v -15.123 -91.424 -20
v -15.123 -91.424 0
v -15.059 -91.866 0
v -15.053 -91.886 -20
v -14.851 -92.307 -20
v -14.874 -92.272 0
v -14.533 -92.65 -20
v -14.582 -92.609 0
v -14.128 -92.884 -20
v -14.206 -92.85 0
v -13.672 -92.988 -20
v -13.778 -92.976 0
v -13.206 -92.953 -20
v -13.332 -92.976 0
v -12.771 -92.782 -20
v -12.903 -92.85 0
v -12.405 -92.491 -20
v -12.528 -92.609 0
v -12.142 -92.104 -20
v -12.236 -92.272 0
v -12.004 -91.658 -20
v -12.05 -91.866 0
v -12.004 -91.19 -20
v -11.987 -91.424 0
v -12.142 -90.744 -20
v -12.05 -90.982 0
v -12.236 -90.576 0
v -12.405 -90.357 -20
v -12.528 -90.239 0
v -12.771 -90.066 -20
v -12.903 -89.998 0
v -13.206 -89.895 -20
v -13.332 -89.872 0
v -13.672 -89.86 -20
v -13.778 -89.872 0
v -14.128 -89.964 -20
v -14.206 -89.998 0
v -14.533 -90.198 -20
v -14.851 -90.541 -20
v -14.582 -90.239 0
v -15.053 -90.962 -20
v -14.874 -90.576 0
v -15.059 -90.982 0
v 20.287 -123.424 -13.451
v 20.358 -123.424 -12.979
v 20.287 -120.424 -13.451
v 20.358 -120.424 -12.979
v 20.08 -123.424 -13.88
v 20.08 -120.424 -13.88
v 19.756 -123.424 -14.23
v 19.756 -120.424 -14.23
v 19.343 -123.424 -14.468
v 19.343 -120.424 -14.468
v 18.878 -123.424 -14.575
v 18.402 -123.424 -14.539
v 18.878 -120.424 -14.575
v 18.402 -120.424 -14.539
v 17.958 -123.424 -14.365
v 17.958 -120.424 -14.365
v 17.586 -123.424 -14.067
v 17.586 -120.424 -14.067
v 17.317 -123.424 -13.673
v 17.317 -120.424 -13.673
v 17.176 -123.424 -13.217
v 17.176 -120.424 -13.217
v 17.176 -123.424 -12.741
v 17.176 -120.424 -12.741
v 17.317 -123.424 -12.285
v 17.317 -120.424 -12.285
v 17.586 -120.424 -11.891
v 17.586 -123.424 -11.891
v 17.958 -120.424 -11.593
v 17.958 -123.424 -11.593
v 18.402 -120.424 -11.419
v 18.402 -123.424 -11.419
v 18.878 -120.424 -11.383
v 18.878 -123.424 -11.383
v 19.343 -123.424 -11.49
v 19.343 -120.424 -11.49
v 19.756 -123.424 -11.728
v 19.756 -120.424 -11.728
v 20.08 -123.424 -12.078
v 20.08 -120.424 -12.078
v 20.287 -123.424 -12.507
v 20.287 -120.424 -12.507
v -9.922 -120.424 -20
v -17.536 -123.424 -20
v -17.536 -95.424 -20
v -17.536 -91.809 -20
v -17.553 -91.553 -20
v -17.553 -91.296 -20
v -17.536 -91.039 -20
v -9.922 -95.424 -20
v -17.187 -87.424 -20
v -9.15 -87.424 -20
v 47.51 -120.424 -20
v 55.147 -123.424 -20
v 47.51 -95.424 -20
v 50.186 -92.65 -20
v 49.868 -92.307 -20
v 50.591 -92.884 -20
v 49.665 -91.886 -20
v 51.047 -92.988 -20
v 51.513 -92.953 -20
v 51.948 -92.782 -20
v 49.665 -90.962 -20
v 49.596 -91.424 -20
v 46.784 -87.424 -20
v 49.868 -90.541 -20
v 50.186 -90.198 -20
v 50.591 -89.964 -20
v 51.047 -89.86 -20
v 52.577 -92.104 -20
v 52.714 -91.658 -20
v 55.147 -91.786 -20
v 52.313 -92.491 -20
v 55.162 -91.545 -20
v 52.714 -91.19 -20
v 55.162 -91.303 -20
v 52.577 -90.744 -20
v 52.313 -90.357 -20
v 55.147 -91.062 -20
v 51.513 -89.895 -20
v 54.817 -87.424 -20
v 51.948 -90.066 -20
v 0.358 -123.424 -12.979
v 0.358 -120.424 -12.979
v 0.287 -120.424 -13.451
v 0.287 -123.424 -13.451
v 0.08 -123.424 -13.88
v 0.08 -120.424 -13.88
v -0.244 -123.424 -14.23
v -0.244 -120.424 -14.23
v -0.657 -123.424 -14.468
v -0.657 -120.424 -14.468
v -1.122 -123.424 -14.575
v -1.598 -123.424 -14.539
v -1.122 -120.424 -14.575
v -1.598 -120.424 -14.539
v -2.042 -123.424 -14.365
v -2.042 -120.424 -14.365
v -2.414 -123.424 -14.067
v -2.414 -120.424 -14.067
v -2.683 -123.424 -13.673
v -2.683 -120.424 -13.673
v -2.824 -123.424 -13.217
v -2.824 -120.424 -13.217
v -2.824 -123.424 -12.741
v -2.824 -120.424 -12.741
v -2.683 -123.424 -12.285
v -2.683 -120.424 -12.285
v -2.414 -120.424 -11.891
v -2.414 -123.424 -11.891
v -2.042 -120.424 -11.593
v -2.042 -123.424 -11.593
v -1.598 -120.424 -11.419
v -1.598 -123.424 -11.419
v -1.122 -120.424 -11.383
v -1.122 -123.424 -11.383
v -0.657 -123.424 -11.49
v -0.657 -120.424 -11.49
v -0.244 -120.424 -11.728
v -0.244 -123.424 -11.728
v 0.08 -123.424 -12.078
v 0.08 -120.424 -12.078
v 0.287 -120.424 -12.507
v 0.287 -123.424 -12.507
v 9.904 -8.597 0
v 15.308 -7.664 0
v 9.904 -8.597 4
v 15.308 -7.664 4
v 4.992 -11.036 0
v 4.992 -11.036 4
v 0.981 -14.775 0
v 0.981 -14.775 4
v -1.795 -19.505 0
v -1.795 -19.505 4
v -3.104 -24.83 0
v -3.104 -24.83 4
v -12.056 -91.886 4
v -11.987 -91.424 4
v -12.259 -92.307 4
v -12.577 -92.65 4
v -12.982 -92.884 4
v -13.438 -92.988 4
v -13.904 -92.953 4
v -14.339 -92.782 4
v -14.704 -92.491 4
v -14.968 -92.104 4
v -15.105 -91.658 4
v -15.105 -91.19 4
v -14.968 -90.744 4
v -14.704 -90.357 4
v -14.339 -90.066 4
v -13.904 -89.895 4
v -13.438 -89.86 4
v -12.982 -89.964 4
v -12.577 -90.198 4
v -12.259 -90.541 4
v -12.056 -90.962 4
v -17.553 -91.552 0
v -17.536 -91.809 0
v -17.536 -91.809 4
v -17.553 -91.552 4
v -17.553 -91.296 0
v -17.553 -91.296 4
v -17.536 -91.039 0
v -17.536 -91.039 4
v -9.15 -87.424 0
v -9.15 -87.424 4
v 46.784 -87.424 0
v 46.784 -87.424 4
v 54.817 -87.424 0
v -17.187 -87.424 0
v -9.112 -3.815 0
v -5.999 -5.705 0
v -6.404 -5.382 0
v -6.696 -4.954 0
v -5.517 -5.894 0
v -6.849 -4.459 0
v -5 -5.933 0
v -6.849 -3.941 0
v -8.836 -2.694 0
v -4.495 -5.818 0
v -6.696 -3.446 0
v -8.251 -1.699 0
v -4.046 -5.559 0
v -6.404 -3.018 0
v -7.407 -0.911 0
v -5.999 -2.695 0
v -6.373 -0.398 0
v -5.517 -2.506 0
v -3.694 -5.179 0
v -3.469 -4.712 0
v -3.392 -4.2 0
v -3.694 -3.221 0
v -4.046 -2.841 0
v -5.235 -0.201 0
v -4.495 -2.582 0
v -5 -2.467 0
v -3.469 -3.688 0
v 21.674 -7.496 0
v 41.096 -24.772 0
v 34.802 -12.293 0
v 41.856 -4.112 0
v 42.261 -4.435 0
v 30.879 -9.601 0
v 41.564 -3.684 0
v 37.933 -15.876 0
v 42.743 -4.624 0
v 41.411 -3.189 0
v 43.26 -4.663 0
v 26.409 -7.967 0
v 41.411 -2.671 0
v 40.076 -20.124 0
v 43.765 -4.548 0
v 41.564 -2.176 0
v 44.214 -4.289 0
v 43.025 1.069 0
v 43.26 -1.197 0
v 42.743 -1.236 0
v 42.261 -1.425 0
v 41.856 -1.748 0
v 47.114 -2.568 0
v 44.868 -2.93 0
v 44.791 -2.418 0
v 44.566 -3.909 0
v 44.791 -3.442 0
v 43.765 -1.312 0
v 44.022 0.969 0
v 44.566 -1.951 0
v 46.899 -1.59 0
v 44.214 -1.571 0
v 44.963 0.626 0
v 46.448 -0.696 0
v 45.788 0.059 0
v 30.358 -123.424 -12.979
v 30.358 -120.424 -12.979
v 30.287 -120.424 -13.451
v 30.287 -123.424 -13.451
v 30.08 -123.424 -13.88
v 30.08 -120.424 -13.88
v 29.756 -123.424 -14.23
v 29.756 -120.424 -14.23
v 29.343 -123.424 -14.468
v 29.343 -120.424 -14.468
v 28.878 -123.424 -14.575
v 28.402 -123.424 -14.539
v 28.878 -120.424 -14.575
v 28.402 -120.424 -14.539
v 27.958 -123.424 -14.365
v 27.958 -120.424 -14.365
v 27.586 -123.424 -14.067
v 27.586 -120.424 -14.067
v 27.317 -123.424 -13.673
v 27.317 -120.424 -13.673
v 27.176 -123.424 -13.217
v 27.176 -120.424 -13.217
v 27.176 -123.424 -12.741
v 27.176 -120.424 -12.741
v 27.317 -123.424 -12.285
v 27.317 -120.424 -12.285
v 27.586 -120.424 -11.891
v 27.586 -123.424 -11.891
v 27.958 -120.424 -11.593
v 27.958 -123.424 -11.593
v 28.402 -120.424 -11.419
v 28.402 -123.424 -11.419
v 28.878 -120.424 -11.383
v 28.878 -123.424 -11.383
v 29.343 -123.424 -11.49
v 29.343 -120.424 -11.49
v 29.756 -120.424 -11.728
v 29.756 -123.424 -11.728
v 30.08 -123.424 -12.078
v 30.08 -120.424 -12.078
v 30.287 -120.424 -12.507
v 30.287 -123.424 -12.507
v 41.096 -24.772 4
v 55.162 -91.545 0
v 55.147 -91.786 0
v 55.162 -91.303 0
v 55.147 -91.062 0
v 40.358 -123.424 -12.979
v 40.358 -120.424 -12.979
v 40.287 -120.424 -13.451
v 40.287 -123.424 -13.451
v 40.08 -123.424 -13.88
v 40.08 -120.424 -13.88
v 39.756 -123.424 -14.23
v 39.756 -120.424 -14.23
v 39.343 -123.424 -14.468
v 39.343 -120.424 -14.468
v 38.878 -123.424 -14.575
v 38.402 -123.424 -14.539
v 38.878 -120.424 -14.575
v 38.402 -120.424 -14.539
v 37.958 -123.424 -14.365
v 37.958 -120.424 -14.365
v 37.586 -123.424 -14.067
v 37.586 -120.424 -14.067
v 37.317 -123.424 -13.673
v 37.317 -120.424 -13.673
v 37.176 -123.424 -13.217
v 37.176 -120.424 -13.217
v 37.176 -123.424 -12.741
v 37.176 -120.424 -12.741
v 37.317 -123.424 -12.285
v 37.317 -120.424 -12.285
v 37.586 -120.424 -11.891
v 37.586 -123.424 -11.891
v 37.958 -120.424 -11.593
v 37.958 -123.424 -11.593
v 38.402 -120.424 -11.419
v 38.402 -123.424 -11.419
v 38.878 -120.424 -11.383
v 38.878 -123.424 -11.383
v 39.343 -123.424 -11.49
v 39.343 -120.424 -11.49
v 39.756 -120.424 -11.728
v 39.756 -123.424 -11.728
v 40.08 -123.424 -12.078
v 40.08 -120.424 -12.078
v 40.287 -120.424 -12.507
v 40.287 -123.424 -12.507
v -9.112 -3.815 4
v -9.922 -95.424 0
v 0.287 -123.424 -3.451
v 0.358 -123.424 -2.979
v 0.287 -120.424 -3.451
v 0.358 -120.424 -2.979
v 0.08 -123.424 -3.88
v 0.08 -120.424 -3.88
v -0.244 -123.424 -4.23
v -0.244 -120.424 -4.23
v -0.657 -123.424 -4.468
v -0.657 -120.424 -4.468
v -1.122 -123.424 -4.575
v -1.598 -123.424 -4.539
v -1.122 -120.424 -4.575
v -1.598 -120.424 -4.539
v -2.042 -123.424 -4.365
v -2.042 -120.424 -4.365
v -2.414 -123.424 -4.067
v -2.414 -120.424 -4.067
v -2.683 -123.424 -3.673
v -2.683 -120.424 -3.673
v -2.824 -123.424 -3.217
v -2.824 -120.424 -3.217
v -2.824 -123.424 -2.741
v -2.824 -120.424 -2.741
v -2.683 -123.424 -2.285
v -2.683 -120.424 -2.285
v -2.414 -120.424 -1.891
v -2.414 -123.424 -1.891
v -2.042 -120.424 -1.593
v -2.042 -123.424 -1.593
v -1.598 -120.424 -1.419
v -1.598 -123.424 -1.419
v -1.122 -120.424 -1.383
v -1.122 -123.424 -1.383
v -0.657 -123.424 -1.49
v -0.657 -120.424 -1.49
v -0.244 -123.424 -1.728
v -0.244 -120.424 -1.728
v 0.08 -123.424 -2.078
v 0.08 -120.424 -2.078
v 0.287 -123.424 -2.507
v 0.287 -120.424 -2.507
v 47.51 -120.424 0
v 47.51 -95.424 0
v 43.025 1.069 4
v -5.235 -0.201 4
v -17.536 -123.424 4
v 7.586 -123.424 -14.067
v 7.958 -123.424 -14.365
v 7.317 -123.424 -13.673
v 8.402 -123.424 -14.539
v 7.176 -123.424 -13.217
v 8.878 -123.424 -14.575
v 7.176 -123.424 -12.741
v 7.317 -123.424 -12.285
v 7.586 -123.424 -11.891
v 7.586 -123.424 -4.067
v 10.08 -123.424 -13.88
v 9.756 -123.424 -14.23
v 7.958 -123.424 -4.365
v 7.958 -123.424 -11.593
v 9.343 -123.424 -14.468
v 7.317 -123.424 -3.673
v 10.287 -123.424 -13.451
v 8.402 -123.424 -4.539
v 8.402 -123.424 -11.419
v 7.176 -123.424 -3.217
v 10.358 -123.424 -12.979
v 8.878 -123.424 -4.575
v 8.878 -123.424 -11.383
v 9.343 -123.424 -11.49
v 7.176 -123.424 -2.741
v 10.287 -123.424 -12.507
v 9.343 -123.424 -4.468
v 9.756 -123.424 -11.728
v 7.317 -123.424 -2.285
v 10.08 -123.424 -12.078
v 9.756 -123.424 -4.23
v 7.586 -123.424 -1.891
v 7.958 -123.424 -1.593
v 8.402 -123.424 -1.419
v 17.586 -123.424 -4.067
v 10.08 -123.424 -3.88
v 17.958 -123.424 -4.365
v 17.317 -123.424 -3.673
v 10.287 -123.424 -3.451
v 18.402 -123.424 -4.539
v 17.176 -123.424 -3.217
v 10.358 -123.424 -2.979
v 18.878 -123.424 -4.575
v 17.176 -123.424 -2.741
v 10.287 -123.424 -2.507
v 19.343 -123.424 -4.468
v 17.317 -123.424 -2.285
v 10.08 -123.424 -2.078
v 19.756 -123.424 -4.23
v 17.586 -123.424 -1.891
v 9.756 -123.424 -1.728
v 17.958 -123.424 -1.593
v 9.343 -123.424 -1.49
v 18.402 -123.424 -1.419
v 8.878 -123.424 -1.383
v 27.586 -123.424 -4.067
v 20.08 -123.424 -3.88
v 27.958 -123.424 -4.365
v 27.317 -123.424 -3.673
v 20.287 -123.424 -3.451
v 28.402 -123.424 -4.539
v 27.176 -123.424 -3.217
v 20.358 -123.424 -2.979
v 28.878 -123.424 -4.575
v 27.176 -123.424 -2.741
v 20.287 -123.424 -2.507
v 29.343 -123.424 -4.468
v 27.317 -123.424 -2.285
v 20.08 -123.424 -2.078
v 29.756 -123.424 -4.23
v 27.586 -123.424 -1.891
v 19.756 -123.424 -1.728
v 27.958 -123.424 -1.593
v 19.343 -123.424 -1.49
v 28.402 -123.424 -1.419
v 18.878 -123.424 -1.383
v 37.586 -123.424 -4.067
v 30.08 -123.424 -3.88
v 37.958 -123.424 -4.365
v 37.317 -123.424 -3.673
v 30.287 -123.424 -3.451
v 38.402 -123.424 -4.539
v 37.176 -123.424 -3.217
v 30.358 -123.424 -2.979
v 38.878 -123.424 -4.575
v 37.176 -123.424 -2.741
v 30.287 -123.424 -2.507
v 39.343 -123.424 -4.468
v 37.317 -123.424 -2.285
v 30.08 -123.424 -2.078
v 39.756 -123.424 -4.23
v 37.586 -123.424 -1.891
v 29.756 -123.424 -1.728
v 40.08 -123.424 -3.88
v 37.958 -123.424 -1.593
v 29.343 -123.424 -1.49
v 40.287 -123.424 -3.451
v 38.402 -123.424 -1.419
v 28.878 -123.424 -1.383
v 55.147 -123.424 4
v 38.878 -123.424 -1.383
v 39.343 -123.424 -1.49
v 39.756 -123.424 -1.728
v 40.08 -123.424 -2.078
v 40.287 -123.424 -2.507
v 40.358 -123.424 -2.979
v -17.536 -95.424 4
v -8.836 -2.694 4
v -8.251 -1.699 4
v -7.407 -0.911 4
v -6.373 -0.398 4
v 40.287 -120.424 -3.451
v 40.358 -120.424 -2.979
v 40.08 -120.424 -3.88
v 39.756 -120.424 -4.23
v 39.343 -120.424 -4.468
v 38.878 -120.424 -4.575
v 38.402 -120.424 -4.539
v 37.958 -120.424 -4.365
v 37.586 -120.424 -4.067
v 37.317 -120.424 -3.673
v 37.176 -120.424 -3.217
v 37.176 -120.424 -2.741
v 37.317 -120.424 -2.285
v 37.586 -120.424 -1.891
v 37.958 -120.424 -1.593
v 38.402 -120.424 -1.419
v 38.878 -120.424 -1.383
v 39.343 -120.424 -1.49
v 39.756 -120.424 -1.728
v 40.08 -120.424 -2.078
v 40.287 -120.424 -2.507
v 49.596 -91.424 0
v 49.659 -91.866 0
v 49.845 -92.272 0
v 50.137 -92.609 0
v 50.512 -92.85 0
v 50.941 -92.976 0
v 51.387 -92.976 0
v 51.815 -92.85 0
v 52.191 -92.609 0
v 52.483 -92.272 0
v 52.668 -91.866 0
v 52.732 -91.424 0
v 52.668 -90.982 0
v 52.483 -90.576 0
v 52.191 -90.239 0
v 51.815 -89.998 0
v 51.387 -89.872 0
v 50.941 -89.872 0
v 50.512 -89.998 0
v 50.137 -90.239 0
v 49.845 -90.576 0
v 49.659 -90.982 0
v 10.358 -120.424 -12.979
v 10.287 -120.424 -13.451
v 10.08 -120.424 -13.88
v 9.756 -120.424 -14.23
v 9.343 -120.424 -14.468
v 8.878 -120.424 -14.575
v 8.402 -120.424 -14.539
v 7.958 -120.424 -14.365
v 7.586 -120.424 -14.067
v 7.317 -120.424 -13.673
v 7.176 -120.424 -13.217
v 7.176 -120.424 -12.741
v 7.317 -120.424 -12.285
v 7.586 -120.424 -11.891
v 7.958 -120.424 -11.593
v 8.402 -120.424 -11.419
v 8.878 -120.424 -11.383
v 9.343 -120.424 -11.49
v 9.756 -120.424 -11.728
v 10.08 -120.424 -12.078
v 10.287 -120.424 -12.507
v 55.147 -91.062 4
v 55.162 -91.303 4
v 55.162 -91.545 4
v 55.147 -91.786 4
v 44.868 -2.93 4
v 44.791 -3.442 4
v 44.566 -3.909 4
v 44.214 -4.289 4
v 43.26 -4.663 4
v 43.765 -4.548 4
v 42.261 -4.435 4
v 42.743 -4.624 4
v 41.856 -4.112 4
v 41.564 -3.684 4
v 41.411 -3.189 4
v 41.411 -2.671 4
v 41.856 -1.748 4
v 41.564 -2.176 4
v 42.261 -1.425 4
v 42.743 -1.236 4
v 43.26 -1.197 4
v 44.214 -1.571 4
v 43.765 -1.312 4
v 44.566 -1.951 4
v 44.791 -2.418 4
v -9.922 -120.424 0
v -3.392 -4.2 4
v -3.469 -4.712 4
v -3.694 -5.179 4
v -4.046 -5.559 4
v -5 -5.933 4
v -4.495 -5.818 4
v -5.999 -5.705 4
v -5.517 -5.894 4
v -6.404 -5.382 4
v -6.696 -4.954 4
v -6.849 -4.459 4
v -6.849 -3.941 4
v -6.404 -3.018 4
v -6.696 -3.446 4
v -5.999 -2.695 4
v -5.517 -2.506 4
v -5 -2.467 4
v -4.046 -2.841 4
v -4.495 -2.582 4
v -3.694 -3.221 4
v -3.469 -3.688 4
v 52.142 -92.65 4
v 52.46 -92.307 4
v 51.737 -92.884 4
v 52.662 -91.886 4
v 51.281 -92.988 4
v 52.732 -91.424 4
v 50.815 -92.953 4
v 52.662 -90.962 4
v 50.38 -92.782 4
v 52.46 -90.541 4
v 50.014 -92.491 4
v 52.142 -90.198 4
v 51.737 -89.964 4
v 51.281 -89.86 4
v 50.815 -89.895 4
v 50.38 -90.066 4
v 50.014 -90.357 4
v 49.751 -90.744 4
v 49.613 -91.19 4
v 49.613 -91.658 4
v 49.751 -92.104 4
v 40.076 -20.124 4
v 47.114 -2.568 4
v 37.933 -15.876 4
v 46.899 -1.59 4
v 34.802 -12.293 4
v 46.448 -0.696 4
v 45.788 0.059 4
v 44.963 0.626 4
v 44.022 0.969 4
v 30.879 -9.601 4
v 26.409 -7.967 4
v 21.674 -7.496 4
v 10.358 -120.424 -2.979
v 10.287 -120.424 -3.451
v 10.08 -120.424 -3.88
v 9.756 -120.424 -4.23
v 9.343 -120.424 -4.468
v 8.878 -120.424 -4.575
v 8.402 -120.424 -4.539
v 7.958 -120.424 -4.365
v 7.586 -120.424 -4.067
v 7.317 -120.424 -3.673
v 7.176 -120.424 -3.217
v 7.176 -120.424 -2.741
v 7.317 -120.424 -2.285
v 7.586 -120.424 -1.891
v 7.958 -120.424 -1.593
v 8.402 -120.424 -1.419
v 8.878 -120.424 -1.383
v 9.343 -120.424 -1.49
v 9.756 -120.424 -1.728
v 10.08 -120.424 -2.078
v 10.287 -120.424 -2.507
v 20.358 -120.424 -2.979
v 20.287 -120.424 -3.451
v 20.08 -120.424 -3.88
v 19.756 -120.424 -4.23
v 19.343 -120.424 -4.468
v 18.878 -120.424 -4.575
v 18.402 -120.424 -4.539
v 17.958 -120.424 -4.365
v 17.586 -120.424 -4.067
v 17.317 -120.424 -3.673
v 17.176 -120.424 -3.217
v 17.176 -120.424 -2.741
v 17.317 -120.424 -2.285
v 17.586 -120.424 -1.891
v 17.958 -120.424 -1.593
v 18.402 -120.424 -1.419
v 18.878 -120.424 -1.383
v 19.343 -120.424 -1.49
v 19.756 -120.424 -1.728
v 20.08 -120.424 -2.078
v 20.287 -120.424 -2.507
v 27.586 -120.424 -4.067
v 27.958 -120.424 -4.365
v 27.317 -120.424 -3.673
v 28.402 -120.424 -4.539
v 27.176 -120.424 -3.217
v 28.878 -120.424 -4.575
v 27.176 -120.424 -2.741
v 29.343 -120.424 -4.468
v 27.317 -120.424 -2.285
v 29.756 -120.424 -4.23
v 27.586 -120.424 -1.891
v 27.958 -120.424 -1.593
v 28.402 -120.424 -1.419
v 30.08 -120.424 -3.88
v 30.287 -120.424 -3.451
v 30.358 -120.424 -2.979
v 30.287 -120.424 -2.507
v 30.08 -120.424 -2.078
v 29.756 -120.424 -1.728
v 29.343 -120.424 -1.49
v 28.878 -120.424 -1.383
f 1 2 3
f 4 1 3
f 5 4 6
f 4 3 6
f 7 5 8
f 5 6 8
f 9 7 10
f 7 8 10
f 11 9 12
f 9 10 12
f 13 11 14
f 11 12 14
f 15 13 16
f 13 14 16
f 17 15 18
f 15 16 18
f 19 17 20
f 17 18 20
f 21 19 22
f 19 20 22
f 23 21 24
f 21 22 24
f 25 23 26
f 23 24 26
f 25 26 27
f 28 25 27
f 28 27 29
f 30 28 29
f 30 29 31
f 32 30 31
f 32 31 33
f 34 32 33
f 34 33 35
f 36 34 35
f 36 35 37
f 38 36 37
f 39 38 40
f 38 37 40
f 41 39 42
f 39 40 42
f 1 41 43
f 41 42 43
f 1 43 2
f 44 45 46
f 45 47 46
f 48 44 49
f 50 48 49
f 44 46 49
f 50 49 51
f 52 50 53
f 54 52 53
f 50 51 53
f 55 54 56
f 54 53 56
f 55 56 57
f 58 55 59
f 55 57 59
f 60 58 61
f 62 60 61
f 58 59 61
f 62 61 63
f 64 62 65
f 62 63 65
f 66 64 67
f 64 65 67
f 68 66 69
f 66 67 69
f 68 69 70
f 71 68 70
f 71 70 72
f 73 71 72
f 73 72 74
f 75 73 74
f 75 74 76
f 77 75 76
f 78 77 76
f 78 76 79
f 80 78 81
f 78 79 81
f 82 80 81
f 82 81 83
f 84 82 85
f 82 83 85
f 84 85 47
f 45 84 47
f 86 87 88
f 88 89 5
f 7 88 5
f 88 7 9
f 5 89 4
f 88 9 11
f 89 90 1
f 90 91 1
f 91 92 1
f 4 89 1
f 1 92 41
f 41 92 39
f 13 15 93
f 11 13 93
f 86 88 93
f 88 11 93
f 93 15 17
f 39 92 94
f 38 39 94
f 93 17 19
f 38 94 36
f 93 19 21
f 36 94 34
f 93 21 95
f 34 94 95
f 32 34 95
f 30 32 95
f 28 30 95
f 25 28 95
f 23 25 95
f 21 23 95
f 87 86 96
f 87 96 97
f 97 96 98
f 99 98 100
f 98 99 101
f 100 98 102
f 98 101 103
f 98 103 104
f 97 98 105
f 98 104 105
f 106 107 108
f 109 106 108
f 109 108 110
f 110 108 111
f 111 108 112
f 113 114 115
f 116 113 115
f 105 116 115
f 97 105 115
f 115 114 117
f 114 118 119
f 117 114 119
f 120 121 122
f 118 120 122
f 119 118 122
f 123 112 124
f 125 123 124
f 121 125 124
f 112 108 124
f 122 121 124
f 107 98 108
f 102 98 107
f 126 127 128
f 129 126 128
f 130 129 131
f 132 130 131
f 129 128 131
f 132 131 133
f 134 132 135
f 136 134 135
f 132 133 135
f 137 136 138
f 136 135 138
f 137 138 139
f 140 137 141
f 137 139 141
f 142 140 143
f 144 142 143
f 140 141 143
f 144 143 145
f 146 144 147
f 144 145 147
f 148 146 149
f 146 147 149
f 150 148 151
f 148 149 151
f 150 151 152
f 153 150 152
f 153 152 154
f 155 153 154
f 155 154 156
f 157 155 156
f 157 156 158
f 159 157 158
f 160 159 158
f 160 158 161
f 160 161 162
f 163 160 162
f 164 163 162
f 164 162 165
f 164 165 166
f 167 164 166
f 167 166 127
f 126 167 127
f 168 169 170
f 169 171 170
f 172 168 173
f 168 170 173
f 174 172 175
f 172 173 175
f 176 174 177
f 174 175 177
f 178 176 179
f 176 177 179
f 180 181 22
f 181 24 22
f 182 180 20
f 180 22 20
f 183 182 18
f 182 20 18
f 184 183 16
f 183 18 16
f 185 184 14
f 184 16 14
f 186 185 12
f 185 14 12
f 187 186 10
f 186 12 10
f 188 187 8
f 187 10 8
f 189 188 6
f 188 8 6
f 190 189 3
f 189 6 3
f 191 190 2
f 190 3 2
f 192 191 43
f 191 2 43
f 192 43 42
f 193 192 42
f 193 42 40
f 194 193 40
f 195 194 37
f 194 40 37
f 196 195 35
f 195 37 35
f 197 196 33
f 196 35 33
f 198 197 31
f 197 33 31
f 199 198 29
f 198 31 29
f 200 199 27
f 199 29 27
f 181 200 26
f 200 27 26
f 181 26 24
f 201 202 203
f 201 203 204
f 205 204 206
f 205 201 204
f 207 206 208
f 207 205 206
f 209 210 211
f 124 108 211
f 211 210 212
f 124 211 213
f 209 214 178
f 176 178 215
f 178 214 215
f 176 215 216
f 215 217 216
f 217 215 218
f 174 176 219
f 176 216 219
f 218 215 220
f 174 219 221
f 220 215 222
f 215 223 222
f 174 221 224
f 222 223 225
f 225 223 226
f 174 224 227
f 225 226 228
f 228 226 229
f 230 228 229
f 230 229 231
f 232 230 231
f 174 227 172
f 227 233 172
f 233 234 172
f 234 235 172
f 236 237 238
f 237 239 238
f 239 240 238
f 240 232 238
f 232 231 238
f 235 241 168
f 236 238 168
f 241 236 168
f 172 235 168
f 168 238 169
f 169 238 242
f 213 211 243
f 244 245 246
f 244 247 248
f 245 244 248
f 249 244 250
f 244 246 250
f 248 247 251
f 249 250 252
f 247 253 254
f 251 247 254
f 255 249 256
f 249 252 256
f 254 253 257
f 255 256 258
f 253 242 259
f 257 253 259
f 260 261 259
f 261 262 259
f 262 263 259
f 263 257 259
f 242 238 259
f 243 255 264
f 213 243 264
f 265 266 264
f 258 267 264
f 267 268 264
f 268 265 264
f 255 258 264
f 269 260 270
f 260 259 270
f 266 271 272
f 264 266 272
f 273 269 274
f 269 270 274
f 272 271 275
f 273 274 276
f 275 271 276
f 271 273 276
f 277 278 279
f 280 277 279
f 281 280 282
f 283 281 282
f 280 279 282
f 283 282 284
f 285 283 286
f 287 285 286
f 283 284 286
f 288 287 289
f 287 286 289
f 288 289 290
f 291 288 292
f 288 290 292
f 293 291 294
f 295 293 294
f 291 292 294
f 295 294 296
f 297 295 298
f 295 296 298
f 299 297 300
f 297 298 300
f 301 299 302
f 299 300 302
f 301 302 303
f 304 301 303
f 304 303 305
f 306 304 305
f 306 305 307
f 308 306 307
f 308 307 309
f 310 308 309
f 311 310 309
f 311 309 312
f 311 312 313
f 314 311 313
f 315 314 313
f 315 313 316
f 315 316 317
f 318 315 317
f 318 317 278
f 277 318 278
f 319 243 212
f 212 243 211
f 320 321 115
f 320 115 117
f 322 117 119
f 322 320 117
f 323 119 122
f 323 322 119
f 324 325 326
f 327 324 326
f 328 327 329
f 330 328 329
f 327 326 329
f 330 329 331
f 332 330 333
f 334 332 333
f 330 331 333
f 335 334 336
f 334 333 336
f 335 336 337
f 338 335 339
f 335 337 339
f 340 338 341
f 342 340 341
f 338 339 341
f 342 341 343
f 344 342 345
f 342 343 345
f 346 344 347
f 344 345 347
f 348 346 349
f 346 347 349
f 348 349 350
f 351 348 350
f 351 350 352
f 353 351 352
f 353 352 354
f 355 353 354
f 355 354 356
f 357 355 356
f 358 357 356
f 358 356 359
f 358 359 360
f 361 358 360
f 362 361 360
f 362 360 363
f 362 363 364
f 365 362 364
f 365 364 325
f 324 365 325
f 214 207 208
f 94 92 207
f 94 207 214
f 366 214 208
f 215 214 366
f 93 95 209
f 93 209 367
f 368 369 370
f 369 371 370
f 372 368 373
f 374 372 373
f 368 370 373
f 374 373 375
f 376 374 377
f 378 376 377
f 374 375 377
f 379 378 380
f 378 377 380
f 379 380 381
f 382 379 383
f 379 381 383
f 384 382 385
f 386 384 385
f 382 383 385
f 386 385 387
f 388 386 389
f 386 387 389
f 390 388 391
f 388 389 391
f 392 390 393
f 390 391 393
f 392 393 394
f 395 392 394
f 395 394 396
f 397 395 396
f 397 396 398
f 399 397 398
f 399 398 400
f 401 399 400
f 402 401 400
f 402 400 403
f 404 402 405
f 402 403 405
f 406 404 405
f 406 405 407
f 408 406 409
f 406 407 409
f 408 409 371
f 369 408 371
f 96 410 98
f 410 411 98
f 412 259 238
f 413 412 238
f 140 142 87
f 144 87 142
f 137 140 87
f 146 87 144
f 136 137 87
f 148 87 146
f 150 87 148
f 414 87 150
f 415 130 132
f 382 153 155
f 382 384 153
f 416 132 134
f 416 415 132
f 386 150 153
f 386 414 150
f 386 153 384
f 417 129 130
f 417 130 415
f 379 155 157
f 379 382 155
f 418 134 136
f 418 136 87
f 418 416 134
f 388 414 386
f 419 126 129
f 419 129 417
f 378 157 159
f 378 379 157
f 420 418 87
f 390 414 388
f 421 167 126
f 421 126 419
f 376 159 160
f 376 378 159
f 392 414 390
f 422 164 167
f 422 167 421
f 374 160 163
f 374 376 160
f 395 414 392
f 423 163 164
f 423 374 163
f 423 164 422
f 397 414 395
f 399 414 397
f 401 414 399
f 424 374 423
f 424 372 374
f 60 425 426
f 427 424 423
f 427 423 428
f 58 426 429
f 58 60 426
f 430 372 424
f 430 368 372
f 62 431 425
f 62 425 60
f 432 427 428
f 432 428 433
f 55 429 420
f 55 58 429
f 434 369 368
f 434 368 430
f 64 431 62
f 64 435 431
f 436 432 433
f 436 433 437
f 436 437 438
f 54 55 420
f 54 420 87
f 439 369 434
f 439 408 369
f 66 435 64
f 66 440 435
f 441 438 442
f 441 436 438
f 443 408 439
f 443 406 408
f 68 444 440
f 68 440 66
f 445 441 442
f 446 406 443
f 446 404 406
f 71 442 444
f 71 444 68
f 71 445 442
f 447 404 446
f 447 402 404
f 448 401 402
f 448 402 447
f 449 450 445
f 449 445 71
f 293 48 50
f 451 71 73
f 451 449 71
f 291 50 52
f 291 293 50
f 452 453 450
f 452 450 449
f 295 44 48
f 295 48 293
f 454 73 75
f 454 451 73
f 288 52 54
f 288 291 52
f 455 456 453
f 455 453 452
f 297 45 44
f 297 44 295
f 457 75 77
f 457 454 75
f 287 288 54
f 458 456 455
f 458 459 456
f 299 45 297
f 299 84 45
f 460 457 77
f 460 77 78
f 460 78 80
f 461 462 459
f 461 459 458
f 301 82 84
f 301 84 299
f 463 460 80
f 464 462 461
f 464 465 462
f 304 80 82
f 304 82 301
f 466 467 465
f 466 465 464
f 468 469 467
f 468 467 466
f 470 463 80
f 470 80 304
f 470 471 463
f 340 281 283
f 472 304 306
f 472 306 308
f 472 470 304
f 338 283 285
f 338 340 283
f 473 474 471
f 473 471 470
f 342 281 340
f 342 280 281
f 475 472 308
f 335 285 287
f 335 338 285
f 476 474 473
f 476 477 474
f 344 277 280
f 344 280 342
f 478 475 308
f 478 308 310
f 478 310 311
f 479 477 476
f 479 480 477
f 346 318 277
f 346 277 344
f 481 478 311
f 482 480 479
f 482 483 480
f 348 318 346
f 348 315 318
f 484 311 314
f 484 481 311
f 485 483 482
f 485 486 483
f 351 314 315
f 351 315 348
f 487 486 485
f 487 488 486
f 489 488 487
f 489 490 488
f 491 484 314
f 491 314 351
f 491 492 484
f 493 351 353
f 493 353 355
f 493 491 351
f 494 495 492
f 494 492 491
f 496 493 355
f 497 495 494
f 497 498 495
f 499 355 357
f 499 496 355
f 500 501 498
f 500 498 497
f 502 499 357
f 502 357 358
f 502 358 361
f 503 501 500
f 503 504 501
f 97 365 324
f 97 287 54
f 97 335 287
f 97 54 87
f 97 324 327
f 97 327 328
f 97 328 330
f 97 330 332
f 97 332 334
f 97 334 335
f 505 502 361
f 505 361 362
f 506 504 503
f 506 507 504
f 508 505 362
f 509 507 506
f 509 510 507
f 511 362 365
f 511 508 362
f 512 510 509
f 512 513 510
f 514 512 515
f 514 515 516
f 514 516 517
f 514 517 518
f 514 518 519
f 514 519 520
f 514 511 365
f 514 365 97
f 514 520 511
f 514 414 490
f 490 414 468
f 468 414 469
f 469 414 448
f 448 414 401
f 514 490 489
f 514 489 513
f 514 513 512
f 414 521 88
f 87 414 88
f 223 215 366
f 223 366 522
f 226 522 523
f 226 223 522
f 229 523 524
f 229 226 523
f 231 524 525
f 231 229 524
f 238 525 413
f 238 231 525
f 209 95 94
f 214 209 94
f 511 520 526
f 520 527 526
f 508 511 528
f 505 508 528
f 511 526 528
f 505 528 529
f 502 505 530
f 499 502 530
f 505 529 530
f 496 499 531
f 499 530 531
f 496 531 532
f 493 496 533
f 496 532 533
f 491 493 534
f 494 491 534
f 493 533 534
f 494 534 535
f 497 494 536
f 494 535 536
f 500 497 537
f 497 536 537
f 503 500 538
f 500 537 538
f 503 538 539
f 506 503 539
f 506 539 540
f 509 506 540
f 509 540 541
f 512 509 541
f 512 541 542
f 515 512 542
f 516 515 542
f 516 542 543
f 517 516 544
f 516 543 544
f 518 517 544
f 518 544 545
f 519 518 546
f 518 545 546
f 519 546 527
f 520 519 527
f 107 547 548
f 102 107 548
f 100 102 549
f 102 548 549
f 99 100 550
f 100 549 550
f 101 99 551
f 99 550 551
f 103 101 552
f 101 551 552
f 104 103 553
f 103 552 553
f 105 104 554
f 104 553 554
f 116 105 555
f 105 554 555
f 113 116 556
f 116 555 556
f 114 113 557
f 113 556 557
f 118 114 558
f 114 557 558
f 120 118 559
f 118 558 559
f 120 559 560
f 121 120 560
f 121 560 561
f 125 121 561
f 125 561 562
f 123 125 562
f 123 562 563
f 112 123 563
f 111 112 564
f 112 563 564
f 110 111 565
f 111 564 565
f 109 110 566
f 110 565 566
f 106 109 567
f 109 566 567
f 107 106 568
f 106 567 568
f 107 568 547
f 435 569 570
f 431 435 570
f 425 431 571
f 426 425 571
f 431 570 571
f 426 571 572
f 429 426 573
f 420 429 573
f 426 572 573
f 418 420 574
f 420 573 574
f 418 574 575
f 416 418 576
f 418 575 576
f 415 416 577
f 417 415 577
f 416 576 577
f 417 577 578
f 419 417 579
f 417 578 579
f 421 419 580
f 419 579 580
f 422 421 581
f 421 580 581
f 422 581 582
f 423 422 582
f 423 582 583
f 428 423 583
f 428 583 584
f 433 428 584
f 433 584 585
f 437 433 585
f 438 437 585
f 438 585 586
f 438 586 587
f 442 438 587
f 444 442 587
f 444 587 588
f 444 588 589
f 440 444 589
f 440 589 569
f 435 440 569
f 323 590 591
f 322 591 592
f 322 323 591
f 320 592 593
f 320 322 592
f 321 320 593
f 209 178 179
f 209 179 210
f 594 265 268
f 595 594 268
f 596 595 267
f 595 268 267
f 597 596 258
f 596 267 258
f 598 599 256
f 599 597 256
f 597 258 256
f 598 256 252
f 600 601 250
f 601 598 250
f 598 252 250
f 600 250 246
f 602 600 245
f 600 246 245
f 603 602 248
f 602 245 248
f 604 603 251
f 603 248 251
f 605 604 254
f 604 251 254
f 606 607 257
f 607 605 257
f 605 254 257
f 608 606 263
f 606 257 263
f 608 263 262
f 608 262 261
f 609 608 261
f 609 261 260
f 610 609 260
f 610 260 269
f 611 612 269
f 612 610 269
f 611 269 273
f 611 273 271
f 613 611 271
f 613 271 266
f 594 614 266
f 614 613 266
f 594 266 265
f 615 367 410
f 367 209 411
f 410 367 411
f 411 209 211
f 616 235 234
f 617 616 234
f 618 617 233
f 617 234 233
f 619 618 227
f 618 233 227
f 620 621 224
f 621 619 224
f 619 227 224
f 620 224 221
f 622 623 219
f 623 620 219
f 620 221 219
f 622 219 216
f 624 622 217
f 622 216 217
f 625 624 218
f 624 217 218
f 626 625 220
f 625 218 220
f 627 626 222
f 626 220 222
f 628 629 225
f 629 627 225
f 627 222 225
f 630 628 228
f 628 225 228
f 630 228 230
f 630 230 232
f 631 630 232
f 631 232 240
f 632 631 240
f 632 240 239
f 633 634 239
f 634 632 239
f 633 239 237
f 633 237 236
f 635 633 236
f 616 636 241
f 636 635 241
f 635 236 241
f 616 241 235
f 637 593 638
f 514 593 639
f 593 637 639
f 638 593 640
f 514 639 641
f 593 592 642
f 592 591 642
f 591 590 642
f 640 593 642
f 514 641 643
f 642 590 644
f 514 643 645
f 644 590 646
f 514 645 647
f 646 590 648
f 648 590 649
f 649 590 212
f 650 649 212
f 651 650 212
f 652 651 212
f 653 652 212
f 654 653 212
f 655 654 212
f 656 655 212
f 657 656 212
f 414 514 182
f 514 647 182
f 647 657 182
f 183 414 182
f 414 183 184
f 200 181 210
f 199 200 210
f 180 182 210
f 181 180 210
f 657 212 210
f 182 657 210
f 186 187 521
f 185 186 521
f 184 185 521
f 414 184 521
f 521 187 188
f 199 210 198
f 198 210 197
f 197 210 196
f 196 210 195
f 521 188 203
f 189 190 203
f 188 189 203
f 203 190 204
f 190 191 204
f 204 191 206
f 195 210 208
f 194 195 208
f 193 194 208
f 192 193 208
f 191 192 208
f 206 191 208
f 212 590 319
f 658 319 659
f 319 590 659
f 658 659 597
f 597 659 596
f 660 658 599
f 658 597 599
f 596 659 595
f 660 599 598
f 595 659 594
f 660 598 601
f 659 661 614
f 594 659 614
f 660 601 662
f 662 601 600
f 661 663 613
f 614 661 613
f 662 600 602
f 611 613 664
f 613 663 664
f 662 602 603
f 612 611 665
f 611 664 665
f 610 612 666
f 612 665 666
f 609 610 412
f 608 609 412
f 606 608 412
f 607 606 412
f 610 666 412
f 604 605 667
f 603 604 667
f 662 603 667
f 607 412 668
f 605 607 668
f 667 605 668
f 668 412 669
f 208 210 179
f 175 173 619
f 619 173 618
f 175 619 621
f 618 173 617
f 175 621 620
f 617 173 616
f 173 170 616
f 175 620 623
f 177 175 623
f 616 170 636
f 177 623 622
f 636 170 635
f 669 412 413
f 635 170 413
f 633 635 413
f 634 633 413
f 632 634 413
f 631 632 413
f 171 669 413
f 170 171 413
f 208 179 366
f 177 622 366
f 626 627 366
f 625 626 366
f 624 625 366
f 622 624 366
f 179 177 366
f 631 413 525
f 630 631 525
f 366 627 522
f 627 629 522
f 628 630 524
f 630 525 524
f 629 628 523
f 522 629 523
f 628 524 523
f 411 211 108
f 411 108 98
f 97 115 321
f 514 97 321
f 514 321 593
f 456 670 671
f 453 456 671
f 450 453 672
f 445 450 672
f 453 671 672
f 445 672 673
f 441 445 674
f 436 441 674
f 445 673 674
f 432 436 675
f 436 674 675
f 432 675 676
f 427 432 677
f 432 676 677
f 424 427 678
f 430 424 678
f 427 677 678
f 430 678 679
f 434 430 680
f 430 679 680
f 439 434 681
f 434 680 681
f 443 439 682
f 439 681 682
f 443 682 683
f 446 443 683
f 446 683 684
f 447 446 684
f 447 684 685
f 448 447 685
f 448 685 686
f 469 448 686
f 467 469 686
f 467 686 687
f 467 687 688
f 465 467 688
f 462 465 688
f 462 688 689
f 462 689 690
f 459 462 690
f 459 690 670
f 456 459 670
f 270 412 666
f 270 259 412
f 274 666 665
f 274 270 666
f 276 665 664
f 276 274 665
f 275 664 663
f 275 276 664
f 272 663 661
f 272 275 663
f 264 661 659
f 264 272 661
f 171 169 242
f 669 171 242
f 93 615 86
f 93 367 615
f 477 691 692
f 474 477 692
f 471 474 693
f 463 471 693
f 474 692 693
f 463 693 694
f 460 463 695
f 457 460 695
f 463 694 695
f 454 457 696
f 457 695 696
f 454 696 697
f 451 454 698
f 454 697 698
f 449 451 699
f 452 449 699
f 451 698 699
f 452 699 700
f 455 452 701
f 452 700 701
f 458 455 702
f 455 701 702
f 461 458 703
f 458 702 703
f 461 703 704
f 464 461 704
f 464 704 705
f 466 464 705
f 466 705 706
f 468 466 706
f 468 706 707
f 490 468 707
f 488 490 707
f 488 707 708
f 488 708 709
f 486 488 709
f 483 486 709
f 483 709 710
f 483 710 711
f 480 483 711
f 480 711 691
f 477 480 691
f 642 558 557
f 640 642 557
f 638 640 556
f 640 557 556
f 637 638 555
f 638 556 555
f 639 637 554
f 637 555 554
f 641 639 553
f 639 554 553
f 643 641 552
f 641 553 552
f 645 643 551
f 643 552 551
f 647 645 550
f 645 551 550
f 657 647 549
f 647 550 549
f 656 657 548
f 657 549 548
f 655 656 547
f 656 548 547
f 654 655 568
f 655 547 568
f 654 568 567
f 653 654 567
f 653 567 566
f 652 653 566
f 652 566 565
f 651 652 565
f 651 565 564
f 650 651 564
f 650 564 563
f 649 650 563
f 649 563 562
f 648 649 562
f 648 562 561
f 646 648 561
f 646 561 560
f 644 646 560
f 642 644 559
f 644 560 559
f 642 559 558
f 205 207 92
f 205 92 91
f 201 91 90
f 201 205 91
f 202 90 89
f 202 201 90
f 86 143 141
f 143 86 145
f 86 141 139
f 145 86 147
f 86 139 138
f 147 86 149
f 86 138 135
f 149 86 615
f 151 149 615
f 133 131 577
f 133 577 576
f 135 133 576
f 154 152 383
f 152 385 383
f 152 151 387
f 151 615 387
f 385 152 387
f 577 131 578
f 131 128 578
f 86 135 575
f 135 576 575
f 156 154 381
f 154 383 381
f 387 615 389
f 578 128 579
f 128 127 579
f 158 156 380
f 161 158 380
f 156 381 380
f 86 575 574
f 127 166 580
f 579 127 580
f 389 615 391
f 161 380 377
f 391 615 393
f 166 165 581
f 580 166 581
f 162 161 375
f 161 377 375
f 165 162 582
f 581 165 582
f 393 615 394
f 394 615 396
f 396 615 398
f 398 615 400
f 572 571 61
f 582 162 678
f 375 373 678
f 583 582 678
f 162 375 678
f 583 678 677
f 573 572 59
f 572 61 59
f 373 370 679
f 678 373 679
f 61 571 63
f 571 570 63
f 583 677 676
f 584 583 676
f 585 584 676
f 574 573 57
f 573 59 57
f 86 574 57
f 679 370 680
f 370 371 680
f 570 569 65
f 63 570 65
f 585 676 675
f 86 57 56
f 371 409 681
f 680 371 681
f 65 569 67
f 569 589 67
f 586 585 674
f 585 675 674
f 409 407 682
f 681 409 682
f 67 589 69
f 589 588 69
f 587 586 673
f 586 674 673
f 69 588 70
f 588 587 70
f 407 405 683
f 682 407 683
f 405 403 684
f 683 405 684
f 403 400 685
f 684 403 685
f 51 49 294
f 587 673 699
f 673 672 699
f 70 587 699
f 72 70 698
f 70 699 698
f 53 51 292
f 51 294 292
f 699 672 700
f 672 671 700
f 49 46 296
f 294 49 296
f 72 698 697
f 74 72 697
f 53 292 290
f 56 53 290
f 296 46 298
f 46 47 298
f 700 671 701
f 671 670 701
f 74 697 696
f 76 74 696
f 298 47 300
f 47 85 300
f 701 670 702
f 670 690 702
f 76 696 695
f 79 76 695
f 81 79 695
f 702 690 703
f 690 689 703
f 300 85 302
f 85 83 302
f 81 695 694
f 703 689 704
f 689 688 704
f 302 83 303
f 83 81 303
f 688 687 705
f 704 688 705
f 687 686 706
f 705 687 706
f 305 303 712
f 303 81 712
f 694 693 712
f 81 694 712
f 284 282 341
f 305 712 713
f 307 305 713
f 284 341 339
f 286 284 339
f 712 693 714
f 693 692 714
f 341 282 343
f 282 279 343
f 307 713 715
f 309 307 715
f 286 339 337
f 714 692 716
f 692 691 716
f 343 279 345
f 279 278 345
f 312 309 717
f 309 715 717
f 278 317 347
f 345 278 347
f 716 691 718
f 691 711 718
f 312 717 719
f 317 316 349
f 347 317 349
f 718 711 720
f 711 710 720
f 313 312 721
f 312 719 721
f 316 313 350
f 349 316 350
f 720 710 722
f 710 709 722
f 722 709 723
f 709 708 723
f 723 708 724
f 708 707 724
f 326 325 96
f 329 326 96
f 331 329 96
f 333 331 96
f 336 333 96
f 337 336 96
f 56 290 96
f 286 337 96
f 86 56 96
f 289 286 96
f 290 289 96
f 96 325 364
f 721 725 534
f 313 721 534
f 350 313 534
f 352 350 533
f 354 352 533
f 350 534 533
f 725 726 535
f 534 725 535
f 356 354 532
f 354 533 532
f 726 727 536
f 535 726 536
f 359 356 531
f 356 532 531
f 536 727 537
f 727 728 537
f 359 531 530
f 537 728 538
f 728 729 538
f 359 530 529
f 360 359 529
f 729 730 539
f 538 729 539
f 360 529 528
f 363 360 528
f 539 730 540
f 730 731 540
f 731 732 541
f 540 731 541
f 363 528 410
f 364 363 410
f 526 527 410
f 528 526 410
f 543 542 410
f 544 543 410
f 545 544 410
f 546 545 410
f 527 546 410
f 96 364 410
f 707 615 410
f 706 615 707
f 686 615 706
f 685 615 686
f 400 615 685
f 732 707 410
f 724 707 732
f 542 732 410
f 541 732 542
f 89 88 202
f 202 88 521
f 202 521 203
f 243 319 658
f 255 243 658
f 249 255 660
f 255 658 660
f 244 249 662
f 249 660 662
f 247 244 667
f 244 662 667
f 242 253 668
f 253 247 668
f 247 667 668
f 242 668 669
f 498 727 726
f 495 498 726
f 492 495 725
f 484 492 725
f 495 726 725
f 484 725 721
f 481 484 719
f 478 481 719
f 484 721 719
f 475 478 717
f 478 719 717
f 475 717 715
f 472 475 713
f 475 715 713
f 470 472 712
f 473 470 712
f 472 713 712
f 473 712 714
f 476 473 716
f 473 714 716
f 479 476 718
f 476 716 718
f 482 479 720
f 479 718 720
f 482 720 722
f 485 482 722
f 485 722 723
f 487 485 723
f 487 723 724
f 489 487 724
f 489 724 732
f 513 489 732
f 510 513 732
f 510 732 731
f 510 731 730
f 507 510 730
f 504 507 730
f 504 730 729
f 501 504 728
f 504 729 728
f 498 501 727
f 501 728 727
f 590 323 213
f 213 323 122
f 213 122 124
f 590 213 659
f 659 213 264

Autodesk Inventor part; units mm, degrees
ref_plane "YZ Plane" through (0, 0, 0) normal (1, 0, 0) x (0, 1, 0)
ref_plane "XZ Plane" through (0, 0, 0) normal (0, 1, 0) x (-1, 0, 0)
sketch "Esquisse1" plane through (0, 0, 0) normal (0, 0, 1) x (1, 0, 0)
  circle A0 centre (-5.13, -4.2) radius 1.738 projected
  circle A1 centre (43.13, -2.93) radius 1.738 projected
  circle A2 centre (10.11, -55) radius 1.738 projected
  circle A3 centre (51.1638, -91.424) radius 1.5682 projected
  circle A4 centre (-13.5548, -91.424) radius 1.5682 projected
  line L0 (-5.13, -4.2) -> (43.13, -2.93) construction
  line L1 (-5.0248, -8.1986) -> (43.2352, -6.9286)
  line L2 (43.0248, 1.0686) -> (-5.2352, -0.2014)
  arc A5 (-5.2352, -0.2014) -> (-5.0248, -8.1986) centre (-5.13, -4.2) ccw
  arc A6 (43.2352, -6.9286) -> (43.0248, 1.0686) centre (43.13, -2.93) ccw
  arc A7 (-1.2987, -3.0506) -> (-8.9613, -5.3494) centre (-5.13, -4.2) ccw
  arc A8 (46.508, -5.0722) -> (39.752, -0.7878) centre (43.13, -2.93) ccw
  arc A9 (-16.909, -89.2447) -> (-10.2005, -93.6032) centre (-13.5548, -91.424) ccw
  arc A10 (48.5091, -94.4161) -> (53.8185, -88.4319) centre (51.1638, -91.424) ccw
  line L3 (43.13, -2.93) -> (51.1638, -91.424) construction
  line L4 (39.1464, -3.2916) -> (47.1802, -91.7856)
  line L5 (55.1474, -91.0623) -> (47.1136, -2.5684)
  arc A11 (47.1136, -2.5684) -> (39.1464, -3.2916) centre (43.13, -2.93) ccw
  arc A12 (47.1802, -91.7856) -> (55.1474, -91.0623) centre (51.1638, -91.424) ccw
  line L6 (-5.13, -4.2) -> (-13.5548, -91.424) construction
  line L7 (-1.1485, -4.5846) -> (-9.5733, -91.8085)
  line L8 (-17.5362, -91.0394) -> (-9.1115, -3.8154)
  arc A13 (-1.1485, -4.5846) -> (-9.1115, -3.8154) centre (-5.13, -4.2) ccw
  arc A14 (-17.5362, -91.0394) -> (-9.5733, -91.8085) centre (-13.5548, -91.424) ccw
  line L9 (-13.5548, -91.424) -> (51.1638, -91.424) construction
  line L10 (-13.5548, -95.424) -> (51.1638, -95.424)
  line L11 (51.1638, -87.424) -> (-13.5548, -87.424)
  arc A15 (-13.5548, -87.424) -> (-13.5548, -95.424) centre (-13.5548, -91.424) ccw
  arc A16 (51.1638, -95.424) -> (51.1638, -87.424) centre (51.1638, -91.424) ccw
  point P0 (0, 0)
  point P1 (19, -3.565)
  point P2 (2.49, -29.6)
  point P3 (-1.7224, -73.212)
  point P4 (30.6369, -73.212)
  point P5 (47.1469, -47.177)
  point P6 (-9.3424, -47.812)
  point P7 (18.8045, -91.424)
  point P8 (39.4855, -7.0273)
  point P9 (46.7842, -87.424)
  point P10 (-9.1498, -87.424)
  point P11 (-1.4886, -8.1056)
  point P12 (-9.1115, -3.8154)
  point P13 (51.1638, -95.424)
  point P14 (47.1136, -2.5684)
  dimension "d2" = 8
  dimension "d3" = 8
  dimension "d5" = 8
  dimension "d6" = 8
extrude "Extrusion1" add sketch "Esquisse1" along normal blind 4 contours A5 A7 A13 L7 L1 | L1 L7 L11 A15 A9 L8 A5 | L7 A13 A7 L2 A8 A11 L4 L1 | L4 A11 A8 A6 L1 | L1 A6 L5 A10 A16 L11 L4 | L11 L4 A12 A10 L10 A9 A14 L7 | L7 A14 A9 A15 L11 | L11 A16 A10 A12 L4
fillet "Congé1" radius 19 2 edges at (-1.4886, -8.1056, 2) (39.4855, -7.0273, 2)
sketch "Esquisse2" plane through (0, 0, 0) normal (0, 0, -1) x (-1, 0, 0)
  arc A0 (9.1115, -3.8154) -> (5.2352, -0.2014) centre (5.13, -4.2) ccw projected
  line L0 (-43.0248, 1.0686) -> (5.2352, -0.2014) projected
  arc A1 (-43.0248, 1.0686) -> (-47.1136, -2.5684) centre (-43.13, -2.93) ccw projected
  line L1 (-55.1474, -91.0623) -> (-47.1136, -2.5684) projected
  arc A2 (-55.1474, -91.0623) -> (-51.1638, -95.424) centre (-51.1638, -91.424) ccw projected
  line L2 (13.5548, -95.424) -> (-51.1638, -95.424) projected
  arc A3 (13.5548, -95.424) -> (17.5362, -91.0394) centre (13.5548, -91.424) ccw projected
  line L3 (9.1115, -3.8154) -> (17.5362, -91.0394) projected
  arc A4 (-21.6744, -7.496) -> (-41.0964, -24.7716) centre (-22.1742, -26.4894) ccw projected
  line L4 (-15.3081, -7.6635) -> (-21.6744, -7.496) projected
  arc A5 (3.104, -24.8303) -> (-15.3081, -7.6635) centre (-15.808, -26.657) ccw projected
  line L5 (9.1498, -87.424) -> (3.104, -24.8303) projected
  line L6 (-46.7842, -87.424) -> (9.1498, -87.424) projected
  line L7 (-41.0964, -24.7716) -> (-46.7842, -87.424) projected
  circle A6 centre (5.13, -4.2) radius 1.738 projected
  circle A7 centre (13.5548, -91.424) radius 1.5682 projected
  circle A8 centre (-43.13, -2.93) radius 1.738 projected
  circle A9 centre (-51.1638, -91.424) radius 1.5682 projected
  line L8 (-41.0964, -24.7716) -> (-46.7842, -87.424) projected
  line L9 (-46.7842, -87.424) -> (-47.5105, -95.424)
  line L10 (-55.1474, -91.0623) -> (-47.1136, -2.5684) projected
  line L11 (-46.7842, -87.424) -> (9.1498, -87.424) projected
  line L12 (-46.7842, -87.424) -> (-54.8171, -87.424)
  line L13 (9.1498, -87.424) -> (9.9225, -95.424)
  line L14 (9.1498, -87.424) -> (17.187, -87.424)
  point P0 (0, 0)
extrude "Extrusion2" add sketch "Esquisse2" along normal blind 20 contours L3 A3 L2 L13 L14 | L9 L2 A2 L1 L12
sketch "Esquisse3" plane through (-13.5548, -95.424, 4) normal (0, -1, 0) x (1, 0, 0)
  line L0 (3.6323, -4) -> (61.0652, -4) projected
  line L1 (61.0652, -4) -> (61.0652, -24) projected
  line L2 (64.7185, -24) -> (61.0652, -24) projected
  line L3 (64.7185, -24) -> (64.7185, 0) projected
  line L4 (0, 0) -> (64.7185, 0) projected
  line L5 (0, -24) -> (0, 0) projected
  line L6 (3.6323, -24) -> (0, -24) projected
  line L7 (3.6323, -4) -> (3.6323, -24) projected
  line L8 (0, -24) -> (0, 0) projected
  line L9 (-3.9815, 0) -> (0, 0) projected
  line L10 (-3.9815, -24) -> (-3.9815, 0) projected
  line L11 (0, -24) -> (-3.9815, -24) projected
  line L12 (68.7022, -24) -> (68.7022, 0) projected
  line L13 (64.7185, 0) -> (68.7022, 0) projected
  line L14 (64.7185, -24) -> (64.7185, 0) projected
  line L15 (68.7022, -24) -> (64.7185, -24) projected
  point P0 (13.5548, -4)
  point P1 (0, 0)
  point P2 (64.7185, 0)
extrude "Extrusion3" add sketch "Esquisse3" along normal blind 25
sketch "Esquisse4" plane through (0, 0, 4) normal (0, 0, 1) x (1, 0, 0)
  arc A0 (-5.2352, -0.2014) -> (-9.1115, -3.8154) centre (-5.13, -4.2) ccw projected
  line L0 (-9.1115, -3.8154) -> (-17.5362, -91.0394) projected
  arc A1 (-17.5362, -91.0394) -> (-13.5548, -95.424) centre (-13.5548, -91.424) ccw projected
  line L1 (-13.5548, -95.424) -> (-17.5362, -95.424) projected
  line L2 (-17.5362, -95.424) -> (-17.5362, -120.424) projected
  line L3 (55.1474, -120.424) -> (-17.5362, -120.424) projected
  line L4 (55.1474, -95.424) -> (55.1474, -120.424) projected
  line L5 (55.1474, -95.424) -> (51.1638, -95.424) projected
  arc A2 (51.1638, -95.424) -> (55.1474, -91.0623) centre (51.1638, -91.424) ccw projected
  line L6 (55.1474, -91.0623) -> (47.1136, -2.5684) projected
  arc A3 (47.1136, -2.5684) -> (43.0248, 1.0686) centre (43.13, -2.93) ccw projected
  line L7 (43.0248, 1.0686) -> (-5.2352, -0.2014) projected
  line L8 (41.0964, -24.7716) -> (46.7842, -87.424) projected
  line L9 (46.7842, -87.424) -> (-9.1498, -87.424) projected
  line L10 (-9.1498, -87.424) -> (-3.104, -24.8303) projected
  arc A4 (15.3081, -7.6635) -> (-3.104, -24.8303) centre (15.808, -26.657) ccw projected
  line L11 (15.3081, -7.6635) -> (21.6744, -7.496) projected
  arc A5 (41.0964, -24.7716) -> (21.6744, -7.496) centre (22.1742, -26.4894) ccw projected
  circle A6 centre (-5.13, -4.2) radius 1.738 projected
  circle A7 centre (-13.5548, -91.424) radius 1.5682 projected
  circle A8 centre (43.13, -2.93) radius 1.738 projected
  circle A9 centre (51.1638, -91.424) radius 1.5682 projected
  line L12 (-17.5362, -91.0394) -> (-17.187, -87.424) projected
  line L13 (-17.5362, -95.424) -> (-17.5362, -91.0394)
  line L14 (55.1474, -91.0623) -> (55.1474, -95.424)
  point P0 (0, 0)
  point P1 (55.1474, -91.7856)
  point P2 (-17.5362, -91.8085)
extrude "Extrusion4" add sketch "Esquisse4" against normal up to surface (24 mm away) contours A1 L1 L13 | L14 L5 A2
sketch "Esquisse5" plane through (-13.5548, -120.424, 4) normal (0, -1, 0) x (1, 0, 0)
  line L0 (68.7022, 0) -> (-3.9815, 0) projected
  line L1 (-3.9815, 0) -> (-3.9815, -24) projected
  line L2 (68.7022, 0) -> (-3.9815, 0)
  line L3 (-3.9815, 0) -> (-3.9815, -24)
  line L4 (-3.9815, -24) -> (68.7022, -24)
  line L5 (68.7022, -24) -> (68.7022, 0)
  point P0 (13.5548, -4)
extrude "Extrusion5" add sketch "Esquisse5" along normal blind 3
sketch "Esquisse6" plane through (-13.5548, -120.424, 4) normal (0, 1, 0) x (1, 0, 0)
  circle A0 centre (52.3133, 6.979) radius 1.6 projected
  circle A1 centre (52.3133, 16.979) radius 1.6 projected
  circle A2 centre (42.3133, 16.979) radius 1.6 projected
  circle A3 centre (42.3133, 6.979) radius 1.6 projected
  circle A4 centre (32.3133, 6.979) radius 1.6 projected
  circle A5 centre (32.3133, 16.979) radius 1.6 projected
  circle A6 centre (22.3133, 16.979) radius 1.6 projected
  circle A7 centre (22.3133, 6.979) radius 1.6 projected
  circle A8 centre (12.3133, 6.979) radius 1.6 projected
  circle A9 centre (12.3133, 16.979) radius 1.6 projected
  point P0 (13.5548, 4)
ref_plane "Plan de construction1" through (-33.0415, -128.424, -137.979) normal (0, -1, 0) x (1, 0, 0)
extrude "Extrusion6" cut sketch "Esquisse6" against normal up to surface (8 mm away)
properties part number "holder"
